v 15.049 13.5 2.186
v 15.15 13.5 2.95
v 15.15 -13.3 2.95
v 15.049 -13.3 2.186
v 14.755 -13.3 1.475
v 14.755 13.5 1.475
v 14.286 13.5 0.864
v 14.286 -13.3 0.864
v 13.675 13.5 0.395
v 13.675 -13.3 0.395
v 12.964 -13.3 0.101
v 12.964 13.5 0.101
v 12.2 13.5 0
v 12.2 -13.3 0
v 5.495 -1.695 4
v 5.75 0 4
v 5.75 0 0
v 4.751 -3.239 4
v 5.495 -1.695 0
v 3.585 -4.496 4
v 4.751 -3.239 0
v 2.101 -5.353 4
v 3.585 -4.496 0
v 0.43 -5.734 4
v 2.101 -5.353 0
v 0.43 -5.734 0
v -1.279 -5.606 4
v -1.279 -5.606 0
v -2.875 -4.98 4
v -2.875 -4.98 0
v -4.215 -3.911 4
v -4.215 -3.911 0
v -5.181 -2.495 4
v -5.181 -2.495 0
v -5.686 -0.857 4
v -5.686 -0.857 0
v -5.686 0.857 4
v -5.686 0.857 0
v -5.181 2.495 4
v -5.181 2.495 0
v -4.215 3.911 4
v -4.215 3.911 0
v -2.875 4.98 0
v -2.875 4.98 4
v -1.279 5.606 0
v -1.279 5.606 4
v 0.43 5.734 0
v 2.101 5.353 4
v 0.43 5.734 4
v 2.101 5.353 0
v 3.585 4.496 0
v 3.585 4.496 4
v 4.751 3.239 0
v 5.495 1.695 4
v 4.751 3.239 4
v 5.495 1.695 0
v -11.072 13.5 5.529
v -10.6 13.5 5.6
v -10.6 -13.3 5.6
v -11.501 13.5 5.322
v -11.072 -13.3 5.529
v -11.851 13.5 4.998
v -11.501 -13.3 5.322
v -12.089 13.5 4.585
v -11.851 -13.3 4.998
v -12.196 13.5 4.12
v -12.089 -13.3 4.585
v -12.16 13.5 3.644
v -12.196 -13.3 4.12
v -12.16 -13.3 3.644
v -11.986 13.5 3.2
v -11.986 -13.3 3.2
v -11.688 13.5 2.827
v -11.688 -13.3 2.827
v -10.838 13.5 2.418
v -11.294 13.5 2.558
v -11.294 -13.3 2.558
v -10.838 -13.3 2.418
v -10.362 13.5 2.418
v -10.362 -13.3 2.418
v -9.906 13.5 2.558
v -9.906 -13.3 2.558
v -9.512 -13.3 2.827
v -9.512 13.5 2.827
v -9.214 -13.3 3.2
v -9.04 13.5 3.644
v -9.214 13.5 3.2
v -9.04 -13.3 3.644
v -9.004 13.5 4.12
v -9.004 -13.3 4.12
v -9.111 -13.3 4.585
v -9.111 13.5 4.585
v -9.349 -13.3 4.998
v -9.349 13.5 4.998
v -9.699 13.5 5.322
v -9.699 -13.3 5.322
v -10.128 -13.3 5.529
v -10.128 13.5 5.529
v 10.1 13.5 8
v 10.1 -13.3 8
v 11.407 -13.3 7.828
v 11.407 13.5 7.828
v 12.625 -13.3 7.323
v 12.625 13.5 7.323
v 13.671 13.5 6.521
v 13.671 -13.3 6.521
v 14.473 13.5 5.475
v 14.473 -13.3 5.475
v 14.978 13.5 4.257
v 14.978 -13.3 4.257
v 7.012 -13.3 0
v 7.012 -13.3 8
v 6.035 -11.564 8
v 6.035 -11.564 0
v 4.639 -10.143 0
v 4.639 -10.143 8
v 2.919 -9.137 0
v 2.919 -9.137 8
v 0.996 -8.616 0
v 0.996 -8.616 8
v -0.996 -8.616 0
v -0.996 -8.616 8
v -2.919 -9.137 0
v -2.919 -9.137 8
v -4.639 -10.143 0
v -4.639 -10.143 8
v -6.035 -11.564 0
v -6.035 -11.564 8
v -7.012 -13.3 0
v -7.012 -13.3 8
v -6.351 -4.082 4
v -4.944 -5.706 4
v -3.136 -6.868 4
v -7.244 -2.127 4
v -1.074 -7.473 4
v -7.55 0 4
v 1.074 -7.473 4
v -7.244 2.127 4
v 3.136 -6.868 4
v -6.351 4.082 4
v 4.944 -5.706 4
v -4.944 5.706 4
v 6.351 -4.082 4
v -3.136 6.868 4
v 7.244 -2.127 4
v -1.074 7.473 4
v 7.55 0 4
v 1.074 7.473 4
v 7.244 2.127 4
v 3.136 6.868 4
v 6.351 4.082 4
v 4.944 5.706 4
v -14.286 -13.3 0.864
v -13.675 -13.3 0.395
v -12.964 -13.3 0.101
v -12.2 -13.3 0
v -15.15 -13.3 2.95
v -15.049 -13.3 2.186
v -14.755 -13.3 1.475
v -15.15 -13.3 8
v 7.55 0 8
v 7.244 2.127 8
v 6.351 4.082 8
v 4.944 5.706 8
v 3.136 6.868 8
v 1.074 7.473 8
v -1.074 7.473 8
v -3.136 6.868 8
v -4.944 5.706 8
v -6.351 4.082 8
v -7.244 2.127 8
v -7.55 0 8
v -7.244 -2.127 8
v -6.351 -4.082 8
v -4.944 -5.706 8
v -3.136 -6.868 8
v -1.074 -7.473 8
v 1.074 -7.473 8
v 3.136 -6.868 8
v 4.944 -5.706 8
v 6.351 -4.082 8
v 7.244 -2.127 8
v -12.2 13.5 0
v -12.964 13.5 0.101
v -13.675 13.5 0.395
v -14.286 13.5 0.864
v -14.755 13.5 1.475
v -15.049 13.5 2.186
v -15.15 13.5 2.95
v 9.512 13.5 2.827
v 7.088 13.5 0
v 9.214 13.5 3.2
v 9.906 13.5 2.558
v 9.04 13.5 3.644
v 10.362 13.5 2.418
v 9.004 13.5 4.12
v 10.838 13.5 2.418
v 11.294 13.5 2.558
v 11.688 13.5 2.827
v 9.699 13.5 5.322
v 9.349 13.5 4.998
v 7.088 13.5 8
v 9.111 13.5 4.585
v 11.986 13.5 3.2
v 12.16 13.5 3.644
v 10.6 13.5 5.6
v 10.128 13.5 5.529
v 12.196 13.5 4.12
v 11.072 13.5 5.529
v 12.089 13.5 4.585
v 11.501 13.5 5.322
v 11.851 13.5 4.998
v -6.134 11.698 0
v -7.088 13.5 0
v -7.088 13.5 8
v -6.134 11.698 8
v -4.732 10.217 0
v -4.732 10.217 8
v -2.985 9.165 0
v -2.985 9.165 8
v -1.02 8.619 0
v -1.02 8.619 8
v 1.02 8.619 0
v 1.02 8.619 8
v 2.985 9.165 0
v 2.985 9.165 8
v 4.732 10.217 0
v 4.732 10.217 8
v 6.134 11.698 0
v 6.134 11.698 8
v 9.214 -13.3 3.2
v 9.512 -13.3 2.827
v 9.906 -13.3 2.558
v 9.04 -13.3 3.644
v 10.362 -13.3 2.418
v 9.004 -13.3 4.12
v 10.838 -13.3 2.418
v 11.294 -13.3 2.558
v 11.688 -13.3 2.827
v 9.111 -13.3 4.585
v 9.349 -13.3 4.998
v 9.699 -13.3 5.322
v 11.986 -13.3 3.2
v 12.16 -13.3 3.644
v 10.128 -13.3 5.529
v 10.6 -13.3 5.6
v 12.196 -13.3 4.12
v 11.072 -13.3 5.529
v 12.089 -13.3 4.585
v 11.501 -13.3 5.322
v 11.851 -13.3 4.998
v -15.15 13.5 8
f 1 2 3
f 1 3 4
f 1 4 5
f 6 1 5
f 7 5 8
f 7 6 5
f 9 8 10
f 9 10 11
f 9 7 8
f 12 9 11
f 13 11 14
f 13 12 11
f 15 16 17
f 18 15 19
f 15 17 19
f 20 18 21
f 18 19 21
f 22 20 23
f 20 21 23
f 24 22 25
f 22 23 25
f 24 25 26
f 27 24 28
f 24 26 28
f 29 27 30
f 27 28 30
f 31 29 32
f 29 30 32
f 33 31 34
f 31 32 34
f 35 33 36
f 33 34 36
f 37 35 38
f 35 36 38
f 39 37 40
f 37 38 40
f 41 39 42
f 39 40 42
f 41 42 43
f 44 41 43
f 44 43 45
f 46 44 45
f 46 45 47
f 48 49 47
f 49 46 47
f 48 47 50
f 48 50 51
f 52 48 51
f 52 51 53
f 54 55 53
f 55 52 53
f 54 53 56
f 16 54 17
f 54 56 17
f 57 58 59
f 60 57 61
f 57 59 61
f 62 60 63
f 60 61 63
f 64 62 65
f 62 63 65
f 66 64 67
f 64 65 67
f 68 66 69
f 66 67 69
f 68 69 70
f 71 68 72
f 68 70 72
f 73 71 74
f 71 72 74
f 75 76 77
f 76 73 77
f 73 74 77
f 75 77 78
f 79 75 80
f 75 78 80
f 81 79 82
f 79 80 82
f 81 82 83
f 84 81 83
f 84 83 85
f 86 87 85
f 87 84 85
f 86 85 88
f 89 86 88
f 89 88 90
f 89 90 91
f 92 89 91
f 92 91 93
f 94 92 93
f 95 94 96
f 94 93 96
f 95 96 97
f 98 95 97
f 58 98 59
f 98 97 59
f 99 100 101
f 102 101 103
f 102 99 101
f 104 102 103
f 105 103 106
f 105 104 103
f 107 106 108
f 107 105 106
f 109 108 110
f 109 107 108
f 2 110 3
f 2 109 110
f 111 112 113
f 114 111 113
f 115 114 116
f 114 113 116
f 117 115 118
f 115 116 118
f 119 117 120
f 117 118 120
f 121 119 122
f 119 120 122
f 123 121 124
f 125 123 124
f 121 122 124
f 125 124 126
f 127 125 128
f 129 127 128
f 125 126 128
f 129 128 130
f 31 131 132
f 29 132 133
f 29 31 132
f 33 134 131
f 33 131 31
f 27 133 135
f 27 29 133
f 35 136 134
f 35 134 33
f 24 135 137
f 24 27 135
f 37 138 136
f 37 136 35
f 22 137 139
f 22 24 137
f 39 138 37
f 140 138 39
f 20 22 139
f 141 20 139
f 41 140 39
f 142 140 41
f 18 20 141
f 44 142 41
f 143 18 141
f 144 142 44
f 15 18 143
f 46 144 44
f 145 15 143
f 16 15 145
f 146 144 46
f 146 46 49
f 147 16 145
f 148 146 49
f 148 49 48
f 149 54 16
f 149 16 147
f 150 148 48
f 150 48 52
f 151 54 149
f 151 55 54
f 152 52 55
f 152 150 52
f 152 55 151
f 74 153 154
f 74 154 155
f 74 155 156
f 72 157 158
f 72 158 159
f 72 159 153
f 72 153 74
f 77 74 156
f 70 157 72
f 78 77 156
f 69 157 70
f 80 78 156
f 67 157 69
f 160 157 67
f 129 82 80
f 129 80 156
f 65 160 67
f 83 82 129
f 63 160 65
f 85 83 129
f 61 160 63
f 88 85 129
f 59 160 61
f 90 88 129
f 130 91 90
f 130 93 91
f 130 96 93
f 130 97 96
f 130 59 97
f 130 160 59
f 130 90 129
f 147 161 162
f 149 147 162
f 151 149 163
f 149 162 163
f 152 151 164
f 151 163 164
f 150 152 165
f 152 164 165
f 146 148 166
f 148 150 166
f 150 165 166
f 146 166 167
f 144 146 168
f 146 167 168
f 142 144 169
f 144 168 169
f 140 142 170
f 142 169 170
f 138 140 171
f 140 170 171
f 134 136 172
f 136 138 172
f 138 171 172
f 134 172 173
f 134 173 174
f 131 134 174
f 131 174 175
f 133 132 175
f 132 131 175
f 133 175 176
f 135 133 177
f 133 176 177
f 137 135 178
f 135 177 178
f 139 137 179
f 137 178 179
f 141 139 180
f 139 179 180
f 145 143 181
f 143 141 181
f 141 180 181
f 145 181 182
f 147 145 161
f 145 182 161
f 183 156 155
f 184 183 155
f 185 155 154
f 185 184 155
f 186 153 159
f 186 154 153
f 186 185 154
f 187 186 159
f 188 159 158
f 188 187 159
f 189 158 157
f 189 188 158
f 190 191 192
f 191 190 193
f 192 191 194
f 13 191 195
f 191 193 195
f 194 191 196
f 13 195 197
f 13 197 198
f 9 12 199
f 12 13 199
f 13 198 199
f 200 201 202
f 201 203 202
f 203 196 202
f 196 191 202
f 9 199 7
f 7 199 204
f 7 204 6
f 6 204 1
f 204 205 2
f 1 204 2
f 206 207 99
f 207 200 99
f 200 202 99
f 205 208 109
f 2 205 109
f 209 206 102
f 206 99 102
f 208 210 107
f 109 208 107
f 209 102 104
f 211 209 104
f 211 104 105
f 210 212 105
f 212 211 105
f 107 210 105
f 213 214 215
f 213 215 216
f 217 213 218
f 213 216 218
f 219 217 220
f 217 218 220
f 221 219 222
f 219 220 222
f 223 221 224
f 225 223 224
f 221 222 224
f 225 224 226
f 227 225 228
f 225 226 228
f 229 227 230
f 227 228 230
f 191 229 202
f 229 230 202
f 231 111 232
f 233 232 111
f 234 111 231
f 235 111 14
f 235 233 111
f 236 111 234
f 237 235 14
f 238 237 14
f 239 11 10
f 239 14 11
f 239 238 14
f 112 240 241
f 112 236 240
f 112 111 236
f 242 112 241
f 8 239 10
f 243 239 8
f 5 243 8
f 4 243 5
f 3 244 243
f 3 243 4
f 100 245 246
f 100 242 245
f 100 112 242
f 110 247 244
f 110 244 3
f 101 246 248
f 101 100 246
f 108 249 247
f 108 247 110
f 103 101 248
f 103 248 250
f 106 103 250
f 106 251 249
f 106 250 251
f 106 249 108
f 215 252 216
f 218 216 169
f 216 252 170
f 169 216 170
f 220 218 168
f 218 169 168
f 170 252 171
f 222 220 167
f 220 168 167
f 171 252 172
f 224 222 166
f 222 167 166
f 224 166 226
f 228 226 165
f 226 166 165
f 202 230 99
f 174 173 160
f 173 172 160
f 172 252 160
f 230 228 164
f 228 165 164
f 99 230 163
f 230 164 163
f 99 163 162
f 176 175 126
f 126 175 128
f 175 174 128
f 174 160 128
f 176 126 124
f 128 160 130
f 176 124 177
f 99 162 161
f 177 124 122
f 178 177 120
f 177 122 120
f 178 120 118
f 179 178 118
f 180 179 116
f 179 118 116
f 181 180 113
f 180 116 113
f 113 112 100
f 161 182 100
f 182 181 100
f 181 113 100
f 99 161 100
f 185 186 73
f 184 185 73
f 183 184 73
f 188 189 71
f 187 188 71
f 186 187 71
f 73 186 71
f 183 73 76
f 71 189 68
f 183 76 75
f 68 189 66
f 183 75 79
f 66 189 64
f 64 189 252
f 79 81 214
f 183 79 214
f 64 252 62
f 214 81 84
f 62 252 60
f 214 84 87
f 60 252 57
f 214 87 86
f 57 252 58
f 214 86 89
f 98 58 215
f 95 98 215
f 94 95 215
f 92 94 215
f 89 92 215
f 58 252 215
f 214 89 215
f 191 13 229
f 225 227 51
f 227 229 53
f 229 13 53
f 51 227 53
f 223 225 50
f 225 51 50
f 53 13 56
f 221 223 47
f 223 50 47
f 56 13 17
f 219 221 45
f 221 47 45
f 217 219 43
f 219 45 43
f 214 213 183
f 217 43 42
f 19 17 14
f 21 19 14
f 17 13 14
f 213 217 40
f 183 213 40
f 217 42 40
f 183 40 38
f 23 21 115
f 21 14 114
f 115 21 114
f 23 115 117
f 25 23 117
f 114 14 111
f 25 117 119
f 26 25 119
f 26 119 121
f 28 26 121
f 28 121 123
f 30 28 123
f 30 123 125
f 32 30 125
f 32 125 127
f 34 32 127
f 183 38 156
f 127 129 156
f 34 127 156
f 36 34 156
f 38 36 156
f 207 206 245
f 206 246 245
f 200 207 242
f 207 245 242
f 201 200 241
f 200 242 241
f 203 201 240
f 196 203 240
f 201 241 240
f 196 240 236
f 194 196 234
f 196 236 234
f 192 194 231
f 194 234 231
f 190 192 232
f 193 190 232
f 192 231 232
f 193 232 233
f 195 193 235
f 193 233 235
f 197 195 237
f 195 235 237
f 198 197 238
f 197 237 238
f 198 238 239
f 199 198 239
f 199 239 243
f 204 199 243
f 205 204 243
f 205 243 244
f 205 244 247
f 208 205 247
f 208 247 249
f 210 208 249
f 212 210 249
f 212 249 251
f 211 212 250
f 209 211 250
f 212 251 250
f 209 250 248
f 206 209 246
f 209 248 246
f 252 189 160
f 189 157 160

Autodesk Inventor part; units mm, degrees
ref_plane "YZ Plane" through (0, 0, 0) normal (1, 0, 0) x (0, 1, 0)
ref_plane "XZ Plane" through (0, 0, 0) normal (0, 1, 0) x (-1, 0, 0)
sketch "Эскиз1" plane through (0, 0, 0) normal (0, 0, 1) x (1, 0, 0)
  circle A0 centre (0, 0) radius 5.75
  circle A1 centre (0, 0) radius 9.55
  line L0 (9.55, 13.5) -> (-9.55, 13.5)
  line L1 (-9.55, 13.5) -> (-9.55, 0)
  line L2 (-9.55, 0) -> (9.55, 0)
  line L3 (9.55, 0) -> (9.55, 13.5)
  line L4 (9.55, 0) -> (-9.55, 0)
  line L5 (-9.55, 0) -> (-9.55, -13.3)
  line L6 (-9.55, -13.3) -> (9.55, -13.3)
  line L7 (9.55, -13.3) -> (9.55, 0)
  point P0 (9.55, 0)
  point P1 (0, 9.55)
  point P2 (-9.55, 0)
  point P3 (9.55, 0)
  point P4 (-9.55, 0)
  point P5 (-4.7236, -8.3)
  point P6 (4.7236, -8.3)
  point P7 (-9.55, 0)
  point P8 (9.55, 0)
  dimension "d0" = 11.5
  dimension "d1" = 19.1
  dimension "d64" = 13.3
  dimension "d85" = 13.5
extrude "Выдавливание1" add sketch "Эскиз1" along normal blind 8 contours L2 A1 A0 | A0 L2 A1 | L7 L6 L5 A1 | A1 L1 L0 L3
ref_plane "РабПлоскость8" through (0, -13.3, 0) normal (1, 0, 0) x (0, 0, -1)
sketch "Эскиз15" plane through (0, 0, 8) normal (0, 0, 1) x (1, 0, 0)
  circle A0 centre (0, 0) radius 5.75 projected
  circle A1 centre (0, 0) radius 7.55
  dimension "d67" = 15.1
extrude "Выдавливание9" cut sketch "Эскиз15" against normal blind 4
sketch "Эскиз16" plane through (-9.55, -13.3, 0) normal (0, -1, 0) x (1, 0, 0)
  line L0 (0, 8) -> (19.1, 8) projected
  line L1 (19.1, 8) -> (24.7, 8)
  line L2 (24.7, 8) -> (24.7, 0)
  line L3 (24.7, 0) -> (19.1, 0)
  line L4 (19.1, 0) -> (19.1, 8)
  point P0 (9.55, 0)
  dimension "d70" = 5.6
  dimension "d71" = 8
extrude "Выдавливание10" add sketch "Эскиз16" against normal up to surface (26.8 mm away)
sketch "Эскиз17" plane through (-9.55, 13.5, 0) normal (0, 1, 0) x (1, 0, 0)
  line L0 (24.7, 0) -> (24.7, -8) projected
  line L1 (24.7, -4) -> (20.15, -4)
  point P0 (9.55, 0)
  dimension "d82" = 4.55
hole "Отверстие4" at (10.6, 13.5, 4) direction (0, -1, 0) diameter 3.2 end through all
fillet "Сопряжение5" radius 2.95 1 edges at (15.15, 0.1, 0)
mirror "Зеркальное отражение5" about plane through (0, -13.3, 0) normal (1, 0, 0) of "Сопряжение5", "Отверстие4", "Выдавливание10", "Выдавливание9"
fillet "Сопряжение6" radius 5.05 1 edges at (15.15, 0.1, 8)
sketch "Эскиз18" plane through (0, 0, 8) normal (0, 0, 1) x (1, 0, 0)
  circle A0 centre (0, 0) radius 7.55 projected
  circle A1 centre (0, 16.1) radius 7.55
  circle A2 centre (0, -16.1) radius 7.55
  dimension "d86" = 16.1
  dimension "d90" = 16.1
extrude "Выдавливание11" cut sketch "Эскиз18" against normal through all contours A1 | A2
equation "\"d90\" = d86"
properties part number "Крепление дифференциала"
